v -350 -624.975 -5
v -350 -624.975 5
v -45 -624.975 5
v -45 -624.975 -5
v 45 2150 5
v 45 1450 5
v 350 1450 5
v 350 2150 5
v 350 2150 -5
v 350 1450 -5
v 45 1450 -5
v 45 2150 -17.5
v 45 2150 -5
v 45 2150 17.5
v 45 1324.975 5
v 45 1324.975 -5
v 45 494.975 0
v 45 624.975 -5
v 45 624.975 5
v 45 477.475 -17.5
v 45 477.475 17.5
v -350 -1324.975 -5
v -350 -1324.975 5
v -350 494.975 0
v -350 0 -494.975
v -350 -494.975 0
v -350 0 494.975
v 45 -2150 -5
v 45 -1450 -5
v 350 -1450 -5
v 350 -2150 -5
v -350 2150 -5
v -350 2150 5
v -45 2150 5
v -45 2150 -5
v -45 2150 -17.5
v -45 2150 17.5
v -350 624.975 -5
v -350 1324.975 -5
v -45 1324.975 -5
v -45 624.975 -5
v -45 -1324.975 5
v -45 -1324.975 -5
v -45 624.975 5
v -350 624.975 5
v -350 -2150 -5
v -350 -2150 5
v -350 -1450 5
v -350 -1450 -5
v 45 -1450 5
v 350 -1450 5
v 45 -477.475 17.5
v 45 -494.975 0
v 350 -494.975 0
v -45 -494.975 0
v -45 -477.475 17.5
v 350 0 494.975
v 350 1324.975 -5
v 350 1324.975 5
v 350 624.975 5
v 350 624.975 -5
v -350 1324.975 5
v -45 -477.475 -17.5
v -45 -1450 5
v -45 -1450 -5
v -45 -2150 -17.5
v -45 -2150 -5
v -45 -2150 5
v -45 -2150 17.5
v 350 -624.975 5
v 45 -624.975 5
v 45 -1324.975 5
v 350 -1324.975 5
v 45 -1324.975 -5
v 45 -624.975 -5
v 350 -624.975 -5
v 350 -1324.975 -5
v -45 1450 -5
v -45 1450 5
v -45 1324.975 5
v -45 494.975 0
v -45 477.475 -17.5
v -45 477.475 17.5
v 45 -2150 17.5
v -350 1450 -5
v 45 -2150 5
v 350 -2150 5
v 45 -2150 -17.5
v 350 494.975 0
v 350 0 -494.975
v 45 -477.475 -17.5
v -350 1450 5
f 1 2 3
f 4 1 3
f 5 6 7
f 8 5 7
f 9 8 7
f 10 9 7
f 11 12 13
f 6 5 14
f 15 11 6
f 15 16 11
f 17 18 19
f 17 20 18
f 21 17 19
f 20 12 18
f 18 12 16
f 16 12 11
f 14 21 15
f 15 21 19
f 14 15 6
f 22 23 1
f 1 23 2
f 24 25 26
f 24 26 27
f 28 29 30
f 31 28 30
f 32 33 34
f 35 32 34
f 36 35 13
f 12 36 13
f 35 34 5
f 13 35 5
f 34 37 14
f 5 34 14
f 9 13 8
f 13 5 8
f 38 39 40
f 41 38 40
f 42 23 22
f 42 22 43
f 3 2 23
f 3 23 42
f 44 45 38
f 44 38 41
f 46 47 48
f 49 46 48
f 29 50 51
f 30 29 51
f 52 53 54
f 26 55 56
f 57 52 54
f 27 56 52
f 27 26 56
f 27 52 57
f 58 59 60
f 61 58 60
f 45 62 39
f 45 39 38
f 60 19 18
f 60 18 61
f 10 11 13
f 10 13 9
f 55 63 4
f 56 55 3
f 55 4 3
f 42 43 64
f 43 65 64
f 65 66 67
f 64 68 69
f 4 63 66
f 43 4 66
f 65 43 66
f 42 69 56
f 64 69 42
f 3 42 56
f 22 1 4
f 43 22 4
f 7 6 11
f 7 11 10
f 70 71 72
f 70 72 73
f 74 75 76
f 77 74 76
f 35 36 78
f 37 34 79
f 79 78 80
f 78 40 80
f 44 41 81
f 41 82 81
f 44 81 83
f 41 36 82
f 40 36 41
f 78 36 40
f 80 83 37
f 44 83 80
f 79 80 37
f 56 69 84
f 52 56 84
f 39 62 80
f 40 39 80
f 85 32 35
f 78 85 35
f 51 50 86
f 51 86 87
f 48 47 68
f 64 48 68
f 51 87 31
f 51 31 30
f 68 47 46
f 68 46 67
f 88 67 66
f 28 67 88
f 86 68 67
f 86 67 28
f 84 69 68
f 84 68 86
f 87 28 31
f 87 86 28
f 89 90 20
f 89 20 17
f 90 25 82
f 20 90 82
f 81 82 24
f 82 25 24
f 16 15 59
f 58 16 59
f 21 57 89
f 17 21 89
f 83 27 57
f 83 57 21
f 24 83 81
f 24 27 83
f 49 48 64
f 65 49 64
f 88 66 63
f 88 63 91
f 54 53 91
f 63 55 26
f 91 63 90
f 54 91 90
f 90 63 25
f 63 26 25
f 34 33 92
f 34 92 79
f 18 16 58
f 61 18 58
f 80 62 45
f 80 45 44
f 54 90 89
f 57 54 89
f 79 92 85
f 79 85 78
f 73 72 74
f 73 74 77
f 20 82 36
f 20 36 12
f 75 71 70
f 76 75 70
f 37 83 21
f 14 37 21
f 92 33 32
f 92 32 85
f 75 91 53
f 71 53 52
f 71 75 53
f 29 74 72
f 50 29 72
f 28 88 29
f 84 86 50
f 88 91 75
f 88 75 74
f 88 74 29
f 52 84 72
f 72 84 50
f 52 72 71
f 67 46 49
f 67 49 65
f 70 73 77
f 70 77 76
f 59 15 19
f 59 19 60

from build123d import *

# Parameters (mm, degrees)
SCHIZZO1_W                   = 700
SCHIZZO1_H                   = 700
ESTRUSIONE_ESTRUSIONE1_DEPTH = 350
SCHIZZO4_W                   = 90
SCHIZZO4_H                   = 35
ESTRUSIONE_ESTRUSIONE2_DEPTH = 2150
SCHIZZO6_W                   = 700
SCHIZZO6_H                   = 700
ESTRUSIONE_ESTRUSIONE3_DEPTH = 5
SCHIZZO7_W                   = 700
SCHIZZO7_H                   = 700
ESTRUSIONE_ESTRUSIONE4_DEPTH = 5
CORPO_SPOSTA_COPIA1_ANGLE    = 98.421058118


with BuildPart() as part:
    # Schizzo1 → Estrusione-Estrusione1 (new, symmetric)
    with BuildSketch(Plane(origin=(0, 0, 0), x_dir=(1, 0, 0), z_dir=(0, 1, 0))):
        Rectangle(SCHIZZO1_W, SCHIZZO1_H)
    extrude(amount=ESTRUSIONE_ESTRUSIONE1_DEPTH, both=True)

    # Schizzo4 → Estrusione-Estrusione2 (add, symmetric)
    with BuildSketch(Plane(origin=(0, 0, 0), x_dir=(0, -1, 0), z_dir=(-0.7071067811865488, 0, 0.7071067811865464))):
        Rectangle(SCHIZZO4_W, SCHIZZO4_H)
    extrude(amount=ESTRUSIONE_ESTRUSIONE2_DEPTH, both=True)

    # Schizzo6 → Estrusione-Estrusione3 (add, symmetric)
    with BuildSketch(Plane(origin=(0, 0, 0), x_dir=(0, -1, 0), z_dir=(0.7071067811865488, 0, 0.7071067811865464))):
        with Locations((0, -974.974746831)):
            Rectangle(SCHIZZO6_W, SCHIZZO6_H)
    estrusione_estrusione3 = extrude(amount=ESTRUSIONE_ESTRUSIONE3_DEPTH, both=True)

    # Schizzo7 → Estrusione-Estrusione4 (add, symmetric)
    with BuildSketch(Plane(origin=(0, 0, 0), x_dir=(0, -1, 0), z_dir=(0.7071067811865488, 0, 0.7071067811865464))):
        with Locations((0, -1800)):
            Rectangle(SCHIZZO7_W, SCHIZZO7_H)
    estrusione_estrusione4 = extrude(amount=ESTRUSIONE_ESTRUSIONE4_DEPTH, both=True)

    # Specchia1: Estrusione-Estrusione3, Estrusione-Estrusione4 across plane
    add(estrusione_estrusione3.mirror(Plane(origin=(0, 0, 0), x_dir=(0.7071067811865465, 0, 0.7071067811865486), z_dir=(-0.7071067811865488, 0, 0.7071067811865464))))
    add(estrusione_estrusione4.mirror(Plane(origin=(0, 0, 0), x_dir=(0.7071067811865465, 0, 0.7071067811865486), z_dir=(-0.7071067811865488, 0, 0.7071067811865464))))


with BuildPart() as part_1:
    # Corpo-Sposta/copia1: moved
    add(part.part.rotate(Axis((0, 0, 0), (0.3574067443365941, -0.3574067443365928, 0.8628562094610166)), CORPO_SPOSTA_COPIA1_ANGLE))


solid = part_1.part
